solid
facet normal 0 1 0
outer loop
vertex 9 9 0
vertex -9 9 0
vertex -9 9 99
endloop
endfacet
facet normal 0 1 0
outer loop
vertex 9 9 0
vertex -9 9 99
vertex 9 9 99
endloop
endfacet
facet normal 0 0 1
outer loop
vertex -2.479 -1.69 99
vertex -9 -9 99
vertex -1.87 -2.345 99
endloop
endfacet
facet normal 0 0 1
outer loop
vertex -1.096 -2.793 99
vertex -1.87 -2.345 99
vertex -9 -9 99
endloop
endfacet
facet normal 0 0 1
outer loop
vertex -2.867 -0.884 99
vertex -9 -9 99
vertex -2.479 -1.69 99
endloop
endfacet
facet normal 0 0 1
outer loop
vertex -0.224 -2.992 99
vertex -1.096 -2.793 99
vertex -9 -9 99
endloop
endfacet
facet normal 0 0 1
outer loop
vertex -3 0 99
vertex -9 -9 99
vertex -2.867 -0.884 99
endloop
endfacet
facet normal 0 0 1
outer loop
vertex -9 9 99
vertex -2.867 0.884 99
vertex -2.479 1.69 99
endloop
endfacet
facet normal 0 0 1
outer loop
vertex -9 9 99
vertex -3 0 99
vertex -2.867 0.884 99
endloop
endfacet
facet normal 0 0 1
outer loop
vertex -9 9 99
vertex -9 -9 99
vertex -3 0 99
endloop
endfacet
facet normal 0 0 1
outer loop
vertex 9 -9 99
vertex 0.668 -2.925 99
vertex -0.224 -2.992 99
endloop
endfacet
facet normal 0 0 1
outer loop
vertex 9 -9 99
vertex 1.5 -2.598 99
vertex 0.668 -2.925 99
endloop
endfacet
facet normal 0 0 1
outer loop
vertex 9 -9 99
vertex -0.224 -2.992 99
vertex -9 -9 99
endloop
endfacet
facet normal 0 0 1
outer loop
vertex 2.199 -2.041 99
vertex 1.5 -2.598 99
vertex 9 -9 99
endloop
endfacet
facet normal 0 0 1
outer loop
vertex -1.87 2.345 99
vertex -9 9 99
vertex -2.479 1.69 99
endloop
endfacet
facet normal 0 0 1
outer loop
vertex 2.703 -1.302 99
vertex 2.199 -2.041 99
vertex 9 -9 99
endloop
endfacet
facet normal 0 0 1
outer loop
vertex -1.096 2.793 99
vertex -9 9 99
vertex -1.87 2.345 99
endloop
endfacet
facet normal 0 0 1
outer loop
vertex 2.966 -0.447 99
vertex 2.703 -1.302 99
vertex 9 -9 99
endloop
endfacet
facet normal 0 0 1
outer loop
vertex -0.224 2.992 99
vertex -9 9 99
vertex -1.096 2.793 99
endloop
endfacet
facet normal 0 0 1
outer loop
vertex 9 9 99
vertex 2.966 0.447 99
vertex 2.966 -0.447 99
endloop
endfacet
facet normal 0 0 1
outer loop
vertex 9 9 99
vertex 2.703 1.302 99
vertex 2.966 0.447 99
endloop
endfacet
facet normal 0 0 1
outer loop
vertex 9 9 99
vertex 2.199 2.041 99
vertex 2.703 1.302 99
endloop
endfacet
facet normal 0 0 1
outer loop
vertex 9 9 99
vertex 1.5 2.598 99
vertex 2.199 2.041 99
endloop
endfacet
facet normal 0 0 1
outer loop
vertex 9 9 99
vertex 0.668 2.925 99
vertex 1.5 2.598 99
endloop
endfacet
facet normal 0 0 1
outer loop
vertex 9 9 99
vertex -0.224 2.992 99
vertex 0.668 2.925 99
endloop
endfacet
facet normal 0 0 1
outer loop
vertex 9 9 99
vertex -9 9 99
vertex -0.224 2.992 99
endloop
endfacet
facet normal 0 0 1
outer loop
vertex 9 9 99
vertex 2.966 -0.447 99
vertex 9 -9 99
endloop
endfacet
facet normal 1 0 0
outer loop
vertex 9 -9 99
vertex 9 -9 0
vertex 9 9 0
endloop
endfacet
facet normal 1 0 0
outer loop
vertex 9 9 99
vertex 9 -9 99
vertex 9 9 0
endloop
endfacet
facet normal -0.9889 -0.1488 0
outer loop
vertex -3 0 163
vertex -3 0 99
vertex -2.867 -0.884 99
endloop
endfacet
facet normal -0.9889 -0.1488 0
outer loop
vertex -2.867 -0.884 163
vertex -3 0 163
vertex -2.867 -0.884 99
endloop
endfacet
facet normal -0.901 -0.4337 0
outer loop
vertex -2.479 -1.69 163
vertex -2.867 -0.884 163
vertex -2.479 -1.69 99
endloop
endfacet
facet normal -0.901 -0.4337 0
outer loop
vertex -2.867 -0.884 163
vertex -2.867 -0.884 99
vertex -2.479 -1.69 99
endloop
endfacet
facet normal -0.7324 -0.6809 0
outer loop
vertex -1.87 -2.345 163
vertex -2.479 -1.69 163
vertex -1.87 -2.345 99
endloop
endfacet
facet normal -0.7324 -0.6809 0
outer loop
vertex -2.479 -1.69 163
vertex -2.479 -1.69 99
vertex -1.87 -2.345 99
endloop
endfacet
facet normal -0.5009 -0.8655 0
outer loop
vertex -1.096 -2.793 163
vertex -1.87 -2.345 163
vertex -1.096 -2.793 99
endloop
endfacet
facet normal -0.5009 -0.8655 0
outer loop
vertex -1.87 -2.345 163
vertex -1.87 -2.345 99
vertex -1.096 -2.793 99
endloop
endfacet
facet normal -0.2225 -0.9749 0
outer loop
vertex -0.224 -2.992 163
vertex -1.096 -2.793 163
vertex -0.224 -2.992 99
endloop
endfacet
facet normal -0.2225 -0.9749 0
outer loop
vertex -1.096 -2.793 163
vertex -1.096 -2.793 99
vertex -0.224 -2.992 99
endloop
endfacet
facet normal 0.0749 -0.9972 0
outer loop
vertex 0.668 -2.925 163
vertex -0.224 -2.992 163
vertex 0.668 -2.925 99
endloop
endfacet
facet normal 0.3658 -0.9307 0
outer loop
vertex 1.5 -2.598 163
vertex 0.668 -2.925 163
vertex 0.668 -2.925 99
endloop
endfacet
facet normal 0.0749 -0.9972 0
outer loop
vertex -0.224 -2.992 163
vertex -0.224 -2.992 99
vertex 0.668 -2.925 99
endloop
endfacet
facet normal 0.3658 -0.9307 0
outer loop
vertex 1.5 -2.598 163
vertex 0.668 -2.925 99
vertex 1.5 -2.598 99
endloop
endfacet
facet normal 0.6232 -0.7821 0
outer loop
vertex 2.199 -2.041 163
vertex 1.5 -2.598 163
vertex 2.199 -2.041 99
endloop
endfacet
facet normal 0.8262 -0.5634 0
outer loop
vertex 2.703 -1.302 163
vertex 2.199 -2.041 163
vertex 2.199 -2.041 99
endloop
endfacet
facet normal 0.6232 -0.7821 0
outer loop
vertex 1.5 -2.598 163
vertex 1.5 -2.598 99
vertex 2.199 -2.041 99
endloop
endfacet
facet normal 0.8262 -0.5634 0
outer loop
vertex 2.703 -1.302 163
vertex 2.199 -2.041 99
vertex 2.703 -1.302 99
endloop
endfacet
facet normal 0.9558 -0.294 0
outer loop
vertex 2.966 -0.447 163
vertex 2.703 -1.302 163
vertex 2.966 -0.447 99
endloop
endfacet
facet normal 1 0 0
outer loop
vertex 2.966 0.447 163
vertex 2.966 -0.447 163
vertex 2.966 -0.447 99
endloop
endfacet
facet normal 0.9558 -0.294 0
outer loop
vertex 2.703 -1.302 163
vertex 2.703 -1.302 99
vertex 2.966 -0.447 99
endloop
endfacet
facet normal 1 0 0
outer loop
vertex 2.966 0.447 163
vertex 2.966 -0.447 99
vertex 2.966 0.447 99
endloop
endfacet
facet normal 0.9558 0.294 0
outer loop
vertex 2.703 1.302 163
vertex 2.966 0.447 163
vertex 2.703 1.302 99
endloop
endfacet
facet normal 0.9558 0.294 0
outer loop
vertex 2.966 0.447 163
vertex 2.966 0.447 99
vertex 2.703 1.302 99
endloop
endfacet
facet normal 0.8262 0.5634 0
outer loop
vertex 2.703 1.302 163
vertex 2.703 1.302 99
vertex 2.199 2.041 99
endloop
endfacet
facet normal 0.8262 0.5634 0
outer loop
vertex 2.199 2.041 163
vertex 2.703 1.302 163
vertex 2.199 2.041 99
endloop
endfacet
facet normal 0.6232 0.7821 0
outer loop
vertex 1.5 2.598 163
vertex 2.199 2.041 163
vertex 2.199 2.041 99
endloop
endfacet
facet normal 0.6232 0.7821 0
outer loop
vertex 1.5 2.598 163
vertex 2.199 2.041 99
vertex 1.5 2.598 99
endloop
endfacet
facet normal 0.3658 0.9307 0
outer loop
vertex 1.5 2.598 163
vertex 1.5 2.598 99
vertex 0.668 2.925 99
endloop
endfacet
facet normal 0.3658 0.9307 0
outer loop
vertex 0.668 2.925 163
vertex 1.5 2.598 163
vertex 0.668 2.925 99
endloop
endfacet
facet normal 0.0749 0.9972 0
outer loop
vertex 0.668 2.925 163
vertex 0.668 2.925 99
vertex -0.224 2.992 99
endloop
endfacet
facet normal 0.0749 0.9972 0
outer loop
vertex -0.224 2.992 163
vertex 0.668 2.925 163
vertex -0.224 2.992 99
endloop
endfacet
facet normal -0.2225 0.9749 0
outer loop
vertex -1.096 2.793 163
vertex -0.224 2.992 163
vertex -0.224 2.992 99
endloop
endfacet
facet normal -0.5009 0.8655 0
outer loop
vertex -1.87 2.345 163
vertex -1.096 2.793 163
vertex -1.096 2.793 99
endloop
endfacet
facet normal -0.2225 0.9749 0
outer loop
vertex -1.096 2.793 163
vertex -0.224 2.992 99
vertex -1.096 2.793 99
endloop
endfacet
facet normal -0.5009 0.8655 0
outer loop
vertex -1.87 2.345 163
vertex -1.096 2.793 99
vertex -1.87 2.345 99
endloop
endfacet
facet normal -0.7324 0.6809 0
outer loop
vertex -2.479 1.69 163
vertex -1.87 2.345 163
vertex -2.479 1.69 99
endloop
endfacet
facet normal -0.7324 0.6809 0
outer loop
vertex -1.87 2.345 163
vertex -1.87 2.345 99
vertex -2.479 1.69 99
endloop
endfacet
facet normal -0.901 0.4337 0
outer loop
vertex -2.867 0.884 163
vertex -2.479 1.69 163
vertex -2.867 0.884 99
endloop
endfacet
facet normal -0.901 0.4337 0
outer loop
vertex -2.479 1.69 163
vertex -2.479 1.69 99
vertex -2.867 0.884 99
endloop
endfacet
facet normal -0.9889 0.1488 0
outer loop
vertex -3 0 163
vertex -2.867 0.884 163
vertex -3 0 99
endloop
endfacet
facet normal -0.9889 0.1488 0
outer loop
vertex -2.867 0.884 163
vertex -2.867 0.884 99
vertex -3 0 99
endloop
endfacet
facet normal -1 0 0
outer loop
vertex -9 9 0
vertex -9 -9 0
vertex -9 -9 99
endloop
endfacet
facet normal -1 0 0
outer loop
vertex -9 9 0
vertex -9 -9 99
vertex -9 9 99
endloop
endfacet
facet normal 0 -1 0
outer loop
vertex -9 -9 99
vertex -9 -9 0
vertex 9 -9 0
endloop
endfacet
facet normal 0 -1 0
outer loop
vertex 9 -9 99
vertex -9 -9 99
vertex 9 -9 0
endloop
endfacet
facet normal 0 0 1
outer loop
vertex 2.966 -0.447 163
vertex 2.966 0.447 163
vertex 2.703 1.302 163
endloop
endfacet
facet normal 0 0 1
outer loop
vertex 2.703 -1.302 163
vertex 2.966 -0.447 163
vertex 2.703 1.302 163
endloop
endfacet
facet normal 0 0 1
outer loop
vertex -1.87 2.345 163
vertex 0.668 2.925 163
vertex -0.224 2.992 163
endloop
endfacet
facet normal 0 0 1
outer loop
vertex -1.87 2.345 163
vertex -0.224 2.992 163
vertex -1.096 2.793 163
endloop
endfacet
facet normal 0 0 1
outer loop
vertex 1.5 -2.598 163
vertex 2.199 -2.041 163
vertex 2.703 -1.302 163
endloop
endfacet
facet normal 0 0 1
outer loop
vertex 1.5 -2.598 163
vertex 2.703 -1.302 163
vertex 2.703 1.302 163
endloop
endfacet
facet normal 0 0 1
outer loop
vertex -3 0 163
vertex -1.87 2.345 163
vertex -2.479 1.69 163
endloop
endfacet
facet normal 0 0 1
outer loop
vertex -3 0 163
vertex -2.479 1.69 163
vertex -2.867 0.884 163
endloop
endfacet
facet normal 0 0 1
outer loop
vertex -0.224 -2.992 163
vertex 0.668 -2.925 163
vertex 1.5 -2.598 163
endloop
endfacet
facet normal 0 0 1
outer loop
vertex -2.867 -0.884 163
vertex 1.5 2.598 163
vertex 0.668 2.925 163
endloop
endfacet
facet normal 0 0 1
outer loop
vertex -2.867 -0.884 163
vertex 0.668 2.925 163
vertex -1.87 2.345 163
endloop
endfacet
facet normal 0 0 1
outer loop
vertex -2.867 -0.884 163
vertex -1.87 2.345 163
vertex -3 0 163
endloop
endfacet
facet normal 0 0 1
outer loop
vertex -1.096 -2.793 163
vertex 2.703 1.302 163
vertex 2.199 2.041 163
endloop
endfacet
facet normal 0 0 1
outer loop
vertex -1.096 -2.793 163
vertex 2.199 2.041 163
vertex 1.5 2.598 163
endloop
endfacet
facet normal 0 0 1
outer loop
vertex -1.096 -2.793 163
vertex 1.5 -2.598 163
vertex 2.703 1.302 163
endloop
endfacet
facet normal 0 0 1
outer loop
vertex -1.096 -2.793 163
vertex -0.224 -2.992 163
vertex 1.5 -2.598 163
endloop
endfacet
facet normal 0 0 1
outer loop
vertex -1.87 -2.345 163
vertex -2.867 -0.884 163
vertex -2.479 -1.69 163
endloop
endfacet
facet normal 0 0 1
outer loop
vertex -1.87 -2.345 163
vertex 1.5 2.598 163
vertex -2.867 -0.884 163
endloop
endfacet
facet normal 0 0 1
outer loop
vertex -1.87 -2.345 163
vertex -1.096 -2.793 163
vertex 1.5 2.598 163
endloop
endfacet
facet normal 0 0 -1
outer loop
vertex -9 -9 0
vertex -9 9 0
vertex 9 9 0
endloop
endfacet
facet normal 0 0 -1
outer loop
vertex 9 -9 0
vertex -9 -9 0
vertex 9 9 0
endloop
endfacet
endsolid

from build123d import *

# Parameters (mm, degrees)
SKETCH_1_W      = 18
SKETCH_1_H      = 18
EXTRUDE_1_DEPTH = 99
SKETCH_2_R      = 3
EXTRUDE_2_DEPTH = 64


with BuildPart() as part:
    # 草图1 → 凸台-拉伸1 (new body)
    with BuildSketch(Plane.XY):
        Rectangle(SKETCH_1_W, SKETCH_1_H)
    extrude(amount=EXTRUDE_1_DEPTH)

    # 草图2 → 凸台-拉伸2 (add)
    with BuildSketch(Plane.XY.offset(99)):
        with Locations(Location((0, 0, 0), (0, 0, 180))):
            Circle(SKETCH_2_R)
    extrude(amount=EXTRUDE_2_DEPTH)


solid = part.part
